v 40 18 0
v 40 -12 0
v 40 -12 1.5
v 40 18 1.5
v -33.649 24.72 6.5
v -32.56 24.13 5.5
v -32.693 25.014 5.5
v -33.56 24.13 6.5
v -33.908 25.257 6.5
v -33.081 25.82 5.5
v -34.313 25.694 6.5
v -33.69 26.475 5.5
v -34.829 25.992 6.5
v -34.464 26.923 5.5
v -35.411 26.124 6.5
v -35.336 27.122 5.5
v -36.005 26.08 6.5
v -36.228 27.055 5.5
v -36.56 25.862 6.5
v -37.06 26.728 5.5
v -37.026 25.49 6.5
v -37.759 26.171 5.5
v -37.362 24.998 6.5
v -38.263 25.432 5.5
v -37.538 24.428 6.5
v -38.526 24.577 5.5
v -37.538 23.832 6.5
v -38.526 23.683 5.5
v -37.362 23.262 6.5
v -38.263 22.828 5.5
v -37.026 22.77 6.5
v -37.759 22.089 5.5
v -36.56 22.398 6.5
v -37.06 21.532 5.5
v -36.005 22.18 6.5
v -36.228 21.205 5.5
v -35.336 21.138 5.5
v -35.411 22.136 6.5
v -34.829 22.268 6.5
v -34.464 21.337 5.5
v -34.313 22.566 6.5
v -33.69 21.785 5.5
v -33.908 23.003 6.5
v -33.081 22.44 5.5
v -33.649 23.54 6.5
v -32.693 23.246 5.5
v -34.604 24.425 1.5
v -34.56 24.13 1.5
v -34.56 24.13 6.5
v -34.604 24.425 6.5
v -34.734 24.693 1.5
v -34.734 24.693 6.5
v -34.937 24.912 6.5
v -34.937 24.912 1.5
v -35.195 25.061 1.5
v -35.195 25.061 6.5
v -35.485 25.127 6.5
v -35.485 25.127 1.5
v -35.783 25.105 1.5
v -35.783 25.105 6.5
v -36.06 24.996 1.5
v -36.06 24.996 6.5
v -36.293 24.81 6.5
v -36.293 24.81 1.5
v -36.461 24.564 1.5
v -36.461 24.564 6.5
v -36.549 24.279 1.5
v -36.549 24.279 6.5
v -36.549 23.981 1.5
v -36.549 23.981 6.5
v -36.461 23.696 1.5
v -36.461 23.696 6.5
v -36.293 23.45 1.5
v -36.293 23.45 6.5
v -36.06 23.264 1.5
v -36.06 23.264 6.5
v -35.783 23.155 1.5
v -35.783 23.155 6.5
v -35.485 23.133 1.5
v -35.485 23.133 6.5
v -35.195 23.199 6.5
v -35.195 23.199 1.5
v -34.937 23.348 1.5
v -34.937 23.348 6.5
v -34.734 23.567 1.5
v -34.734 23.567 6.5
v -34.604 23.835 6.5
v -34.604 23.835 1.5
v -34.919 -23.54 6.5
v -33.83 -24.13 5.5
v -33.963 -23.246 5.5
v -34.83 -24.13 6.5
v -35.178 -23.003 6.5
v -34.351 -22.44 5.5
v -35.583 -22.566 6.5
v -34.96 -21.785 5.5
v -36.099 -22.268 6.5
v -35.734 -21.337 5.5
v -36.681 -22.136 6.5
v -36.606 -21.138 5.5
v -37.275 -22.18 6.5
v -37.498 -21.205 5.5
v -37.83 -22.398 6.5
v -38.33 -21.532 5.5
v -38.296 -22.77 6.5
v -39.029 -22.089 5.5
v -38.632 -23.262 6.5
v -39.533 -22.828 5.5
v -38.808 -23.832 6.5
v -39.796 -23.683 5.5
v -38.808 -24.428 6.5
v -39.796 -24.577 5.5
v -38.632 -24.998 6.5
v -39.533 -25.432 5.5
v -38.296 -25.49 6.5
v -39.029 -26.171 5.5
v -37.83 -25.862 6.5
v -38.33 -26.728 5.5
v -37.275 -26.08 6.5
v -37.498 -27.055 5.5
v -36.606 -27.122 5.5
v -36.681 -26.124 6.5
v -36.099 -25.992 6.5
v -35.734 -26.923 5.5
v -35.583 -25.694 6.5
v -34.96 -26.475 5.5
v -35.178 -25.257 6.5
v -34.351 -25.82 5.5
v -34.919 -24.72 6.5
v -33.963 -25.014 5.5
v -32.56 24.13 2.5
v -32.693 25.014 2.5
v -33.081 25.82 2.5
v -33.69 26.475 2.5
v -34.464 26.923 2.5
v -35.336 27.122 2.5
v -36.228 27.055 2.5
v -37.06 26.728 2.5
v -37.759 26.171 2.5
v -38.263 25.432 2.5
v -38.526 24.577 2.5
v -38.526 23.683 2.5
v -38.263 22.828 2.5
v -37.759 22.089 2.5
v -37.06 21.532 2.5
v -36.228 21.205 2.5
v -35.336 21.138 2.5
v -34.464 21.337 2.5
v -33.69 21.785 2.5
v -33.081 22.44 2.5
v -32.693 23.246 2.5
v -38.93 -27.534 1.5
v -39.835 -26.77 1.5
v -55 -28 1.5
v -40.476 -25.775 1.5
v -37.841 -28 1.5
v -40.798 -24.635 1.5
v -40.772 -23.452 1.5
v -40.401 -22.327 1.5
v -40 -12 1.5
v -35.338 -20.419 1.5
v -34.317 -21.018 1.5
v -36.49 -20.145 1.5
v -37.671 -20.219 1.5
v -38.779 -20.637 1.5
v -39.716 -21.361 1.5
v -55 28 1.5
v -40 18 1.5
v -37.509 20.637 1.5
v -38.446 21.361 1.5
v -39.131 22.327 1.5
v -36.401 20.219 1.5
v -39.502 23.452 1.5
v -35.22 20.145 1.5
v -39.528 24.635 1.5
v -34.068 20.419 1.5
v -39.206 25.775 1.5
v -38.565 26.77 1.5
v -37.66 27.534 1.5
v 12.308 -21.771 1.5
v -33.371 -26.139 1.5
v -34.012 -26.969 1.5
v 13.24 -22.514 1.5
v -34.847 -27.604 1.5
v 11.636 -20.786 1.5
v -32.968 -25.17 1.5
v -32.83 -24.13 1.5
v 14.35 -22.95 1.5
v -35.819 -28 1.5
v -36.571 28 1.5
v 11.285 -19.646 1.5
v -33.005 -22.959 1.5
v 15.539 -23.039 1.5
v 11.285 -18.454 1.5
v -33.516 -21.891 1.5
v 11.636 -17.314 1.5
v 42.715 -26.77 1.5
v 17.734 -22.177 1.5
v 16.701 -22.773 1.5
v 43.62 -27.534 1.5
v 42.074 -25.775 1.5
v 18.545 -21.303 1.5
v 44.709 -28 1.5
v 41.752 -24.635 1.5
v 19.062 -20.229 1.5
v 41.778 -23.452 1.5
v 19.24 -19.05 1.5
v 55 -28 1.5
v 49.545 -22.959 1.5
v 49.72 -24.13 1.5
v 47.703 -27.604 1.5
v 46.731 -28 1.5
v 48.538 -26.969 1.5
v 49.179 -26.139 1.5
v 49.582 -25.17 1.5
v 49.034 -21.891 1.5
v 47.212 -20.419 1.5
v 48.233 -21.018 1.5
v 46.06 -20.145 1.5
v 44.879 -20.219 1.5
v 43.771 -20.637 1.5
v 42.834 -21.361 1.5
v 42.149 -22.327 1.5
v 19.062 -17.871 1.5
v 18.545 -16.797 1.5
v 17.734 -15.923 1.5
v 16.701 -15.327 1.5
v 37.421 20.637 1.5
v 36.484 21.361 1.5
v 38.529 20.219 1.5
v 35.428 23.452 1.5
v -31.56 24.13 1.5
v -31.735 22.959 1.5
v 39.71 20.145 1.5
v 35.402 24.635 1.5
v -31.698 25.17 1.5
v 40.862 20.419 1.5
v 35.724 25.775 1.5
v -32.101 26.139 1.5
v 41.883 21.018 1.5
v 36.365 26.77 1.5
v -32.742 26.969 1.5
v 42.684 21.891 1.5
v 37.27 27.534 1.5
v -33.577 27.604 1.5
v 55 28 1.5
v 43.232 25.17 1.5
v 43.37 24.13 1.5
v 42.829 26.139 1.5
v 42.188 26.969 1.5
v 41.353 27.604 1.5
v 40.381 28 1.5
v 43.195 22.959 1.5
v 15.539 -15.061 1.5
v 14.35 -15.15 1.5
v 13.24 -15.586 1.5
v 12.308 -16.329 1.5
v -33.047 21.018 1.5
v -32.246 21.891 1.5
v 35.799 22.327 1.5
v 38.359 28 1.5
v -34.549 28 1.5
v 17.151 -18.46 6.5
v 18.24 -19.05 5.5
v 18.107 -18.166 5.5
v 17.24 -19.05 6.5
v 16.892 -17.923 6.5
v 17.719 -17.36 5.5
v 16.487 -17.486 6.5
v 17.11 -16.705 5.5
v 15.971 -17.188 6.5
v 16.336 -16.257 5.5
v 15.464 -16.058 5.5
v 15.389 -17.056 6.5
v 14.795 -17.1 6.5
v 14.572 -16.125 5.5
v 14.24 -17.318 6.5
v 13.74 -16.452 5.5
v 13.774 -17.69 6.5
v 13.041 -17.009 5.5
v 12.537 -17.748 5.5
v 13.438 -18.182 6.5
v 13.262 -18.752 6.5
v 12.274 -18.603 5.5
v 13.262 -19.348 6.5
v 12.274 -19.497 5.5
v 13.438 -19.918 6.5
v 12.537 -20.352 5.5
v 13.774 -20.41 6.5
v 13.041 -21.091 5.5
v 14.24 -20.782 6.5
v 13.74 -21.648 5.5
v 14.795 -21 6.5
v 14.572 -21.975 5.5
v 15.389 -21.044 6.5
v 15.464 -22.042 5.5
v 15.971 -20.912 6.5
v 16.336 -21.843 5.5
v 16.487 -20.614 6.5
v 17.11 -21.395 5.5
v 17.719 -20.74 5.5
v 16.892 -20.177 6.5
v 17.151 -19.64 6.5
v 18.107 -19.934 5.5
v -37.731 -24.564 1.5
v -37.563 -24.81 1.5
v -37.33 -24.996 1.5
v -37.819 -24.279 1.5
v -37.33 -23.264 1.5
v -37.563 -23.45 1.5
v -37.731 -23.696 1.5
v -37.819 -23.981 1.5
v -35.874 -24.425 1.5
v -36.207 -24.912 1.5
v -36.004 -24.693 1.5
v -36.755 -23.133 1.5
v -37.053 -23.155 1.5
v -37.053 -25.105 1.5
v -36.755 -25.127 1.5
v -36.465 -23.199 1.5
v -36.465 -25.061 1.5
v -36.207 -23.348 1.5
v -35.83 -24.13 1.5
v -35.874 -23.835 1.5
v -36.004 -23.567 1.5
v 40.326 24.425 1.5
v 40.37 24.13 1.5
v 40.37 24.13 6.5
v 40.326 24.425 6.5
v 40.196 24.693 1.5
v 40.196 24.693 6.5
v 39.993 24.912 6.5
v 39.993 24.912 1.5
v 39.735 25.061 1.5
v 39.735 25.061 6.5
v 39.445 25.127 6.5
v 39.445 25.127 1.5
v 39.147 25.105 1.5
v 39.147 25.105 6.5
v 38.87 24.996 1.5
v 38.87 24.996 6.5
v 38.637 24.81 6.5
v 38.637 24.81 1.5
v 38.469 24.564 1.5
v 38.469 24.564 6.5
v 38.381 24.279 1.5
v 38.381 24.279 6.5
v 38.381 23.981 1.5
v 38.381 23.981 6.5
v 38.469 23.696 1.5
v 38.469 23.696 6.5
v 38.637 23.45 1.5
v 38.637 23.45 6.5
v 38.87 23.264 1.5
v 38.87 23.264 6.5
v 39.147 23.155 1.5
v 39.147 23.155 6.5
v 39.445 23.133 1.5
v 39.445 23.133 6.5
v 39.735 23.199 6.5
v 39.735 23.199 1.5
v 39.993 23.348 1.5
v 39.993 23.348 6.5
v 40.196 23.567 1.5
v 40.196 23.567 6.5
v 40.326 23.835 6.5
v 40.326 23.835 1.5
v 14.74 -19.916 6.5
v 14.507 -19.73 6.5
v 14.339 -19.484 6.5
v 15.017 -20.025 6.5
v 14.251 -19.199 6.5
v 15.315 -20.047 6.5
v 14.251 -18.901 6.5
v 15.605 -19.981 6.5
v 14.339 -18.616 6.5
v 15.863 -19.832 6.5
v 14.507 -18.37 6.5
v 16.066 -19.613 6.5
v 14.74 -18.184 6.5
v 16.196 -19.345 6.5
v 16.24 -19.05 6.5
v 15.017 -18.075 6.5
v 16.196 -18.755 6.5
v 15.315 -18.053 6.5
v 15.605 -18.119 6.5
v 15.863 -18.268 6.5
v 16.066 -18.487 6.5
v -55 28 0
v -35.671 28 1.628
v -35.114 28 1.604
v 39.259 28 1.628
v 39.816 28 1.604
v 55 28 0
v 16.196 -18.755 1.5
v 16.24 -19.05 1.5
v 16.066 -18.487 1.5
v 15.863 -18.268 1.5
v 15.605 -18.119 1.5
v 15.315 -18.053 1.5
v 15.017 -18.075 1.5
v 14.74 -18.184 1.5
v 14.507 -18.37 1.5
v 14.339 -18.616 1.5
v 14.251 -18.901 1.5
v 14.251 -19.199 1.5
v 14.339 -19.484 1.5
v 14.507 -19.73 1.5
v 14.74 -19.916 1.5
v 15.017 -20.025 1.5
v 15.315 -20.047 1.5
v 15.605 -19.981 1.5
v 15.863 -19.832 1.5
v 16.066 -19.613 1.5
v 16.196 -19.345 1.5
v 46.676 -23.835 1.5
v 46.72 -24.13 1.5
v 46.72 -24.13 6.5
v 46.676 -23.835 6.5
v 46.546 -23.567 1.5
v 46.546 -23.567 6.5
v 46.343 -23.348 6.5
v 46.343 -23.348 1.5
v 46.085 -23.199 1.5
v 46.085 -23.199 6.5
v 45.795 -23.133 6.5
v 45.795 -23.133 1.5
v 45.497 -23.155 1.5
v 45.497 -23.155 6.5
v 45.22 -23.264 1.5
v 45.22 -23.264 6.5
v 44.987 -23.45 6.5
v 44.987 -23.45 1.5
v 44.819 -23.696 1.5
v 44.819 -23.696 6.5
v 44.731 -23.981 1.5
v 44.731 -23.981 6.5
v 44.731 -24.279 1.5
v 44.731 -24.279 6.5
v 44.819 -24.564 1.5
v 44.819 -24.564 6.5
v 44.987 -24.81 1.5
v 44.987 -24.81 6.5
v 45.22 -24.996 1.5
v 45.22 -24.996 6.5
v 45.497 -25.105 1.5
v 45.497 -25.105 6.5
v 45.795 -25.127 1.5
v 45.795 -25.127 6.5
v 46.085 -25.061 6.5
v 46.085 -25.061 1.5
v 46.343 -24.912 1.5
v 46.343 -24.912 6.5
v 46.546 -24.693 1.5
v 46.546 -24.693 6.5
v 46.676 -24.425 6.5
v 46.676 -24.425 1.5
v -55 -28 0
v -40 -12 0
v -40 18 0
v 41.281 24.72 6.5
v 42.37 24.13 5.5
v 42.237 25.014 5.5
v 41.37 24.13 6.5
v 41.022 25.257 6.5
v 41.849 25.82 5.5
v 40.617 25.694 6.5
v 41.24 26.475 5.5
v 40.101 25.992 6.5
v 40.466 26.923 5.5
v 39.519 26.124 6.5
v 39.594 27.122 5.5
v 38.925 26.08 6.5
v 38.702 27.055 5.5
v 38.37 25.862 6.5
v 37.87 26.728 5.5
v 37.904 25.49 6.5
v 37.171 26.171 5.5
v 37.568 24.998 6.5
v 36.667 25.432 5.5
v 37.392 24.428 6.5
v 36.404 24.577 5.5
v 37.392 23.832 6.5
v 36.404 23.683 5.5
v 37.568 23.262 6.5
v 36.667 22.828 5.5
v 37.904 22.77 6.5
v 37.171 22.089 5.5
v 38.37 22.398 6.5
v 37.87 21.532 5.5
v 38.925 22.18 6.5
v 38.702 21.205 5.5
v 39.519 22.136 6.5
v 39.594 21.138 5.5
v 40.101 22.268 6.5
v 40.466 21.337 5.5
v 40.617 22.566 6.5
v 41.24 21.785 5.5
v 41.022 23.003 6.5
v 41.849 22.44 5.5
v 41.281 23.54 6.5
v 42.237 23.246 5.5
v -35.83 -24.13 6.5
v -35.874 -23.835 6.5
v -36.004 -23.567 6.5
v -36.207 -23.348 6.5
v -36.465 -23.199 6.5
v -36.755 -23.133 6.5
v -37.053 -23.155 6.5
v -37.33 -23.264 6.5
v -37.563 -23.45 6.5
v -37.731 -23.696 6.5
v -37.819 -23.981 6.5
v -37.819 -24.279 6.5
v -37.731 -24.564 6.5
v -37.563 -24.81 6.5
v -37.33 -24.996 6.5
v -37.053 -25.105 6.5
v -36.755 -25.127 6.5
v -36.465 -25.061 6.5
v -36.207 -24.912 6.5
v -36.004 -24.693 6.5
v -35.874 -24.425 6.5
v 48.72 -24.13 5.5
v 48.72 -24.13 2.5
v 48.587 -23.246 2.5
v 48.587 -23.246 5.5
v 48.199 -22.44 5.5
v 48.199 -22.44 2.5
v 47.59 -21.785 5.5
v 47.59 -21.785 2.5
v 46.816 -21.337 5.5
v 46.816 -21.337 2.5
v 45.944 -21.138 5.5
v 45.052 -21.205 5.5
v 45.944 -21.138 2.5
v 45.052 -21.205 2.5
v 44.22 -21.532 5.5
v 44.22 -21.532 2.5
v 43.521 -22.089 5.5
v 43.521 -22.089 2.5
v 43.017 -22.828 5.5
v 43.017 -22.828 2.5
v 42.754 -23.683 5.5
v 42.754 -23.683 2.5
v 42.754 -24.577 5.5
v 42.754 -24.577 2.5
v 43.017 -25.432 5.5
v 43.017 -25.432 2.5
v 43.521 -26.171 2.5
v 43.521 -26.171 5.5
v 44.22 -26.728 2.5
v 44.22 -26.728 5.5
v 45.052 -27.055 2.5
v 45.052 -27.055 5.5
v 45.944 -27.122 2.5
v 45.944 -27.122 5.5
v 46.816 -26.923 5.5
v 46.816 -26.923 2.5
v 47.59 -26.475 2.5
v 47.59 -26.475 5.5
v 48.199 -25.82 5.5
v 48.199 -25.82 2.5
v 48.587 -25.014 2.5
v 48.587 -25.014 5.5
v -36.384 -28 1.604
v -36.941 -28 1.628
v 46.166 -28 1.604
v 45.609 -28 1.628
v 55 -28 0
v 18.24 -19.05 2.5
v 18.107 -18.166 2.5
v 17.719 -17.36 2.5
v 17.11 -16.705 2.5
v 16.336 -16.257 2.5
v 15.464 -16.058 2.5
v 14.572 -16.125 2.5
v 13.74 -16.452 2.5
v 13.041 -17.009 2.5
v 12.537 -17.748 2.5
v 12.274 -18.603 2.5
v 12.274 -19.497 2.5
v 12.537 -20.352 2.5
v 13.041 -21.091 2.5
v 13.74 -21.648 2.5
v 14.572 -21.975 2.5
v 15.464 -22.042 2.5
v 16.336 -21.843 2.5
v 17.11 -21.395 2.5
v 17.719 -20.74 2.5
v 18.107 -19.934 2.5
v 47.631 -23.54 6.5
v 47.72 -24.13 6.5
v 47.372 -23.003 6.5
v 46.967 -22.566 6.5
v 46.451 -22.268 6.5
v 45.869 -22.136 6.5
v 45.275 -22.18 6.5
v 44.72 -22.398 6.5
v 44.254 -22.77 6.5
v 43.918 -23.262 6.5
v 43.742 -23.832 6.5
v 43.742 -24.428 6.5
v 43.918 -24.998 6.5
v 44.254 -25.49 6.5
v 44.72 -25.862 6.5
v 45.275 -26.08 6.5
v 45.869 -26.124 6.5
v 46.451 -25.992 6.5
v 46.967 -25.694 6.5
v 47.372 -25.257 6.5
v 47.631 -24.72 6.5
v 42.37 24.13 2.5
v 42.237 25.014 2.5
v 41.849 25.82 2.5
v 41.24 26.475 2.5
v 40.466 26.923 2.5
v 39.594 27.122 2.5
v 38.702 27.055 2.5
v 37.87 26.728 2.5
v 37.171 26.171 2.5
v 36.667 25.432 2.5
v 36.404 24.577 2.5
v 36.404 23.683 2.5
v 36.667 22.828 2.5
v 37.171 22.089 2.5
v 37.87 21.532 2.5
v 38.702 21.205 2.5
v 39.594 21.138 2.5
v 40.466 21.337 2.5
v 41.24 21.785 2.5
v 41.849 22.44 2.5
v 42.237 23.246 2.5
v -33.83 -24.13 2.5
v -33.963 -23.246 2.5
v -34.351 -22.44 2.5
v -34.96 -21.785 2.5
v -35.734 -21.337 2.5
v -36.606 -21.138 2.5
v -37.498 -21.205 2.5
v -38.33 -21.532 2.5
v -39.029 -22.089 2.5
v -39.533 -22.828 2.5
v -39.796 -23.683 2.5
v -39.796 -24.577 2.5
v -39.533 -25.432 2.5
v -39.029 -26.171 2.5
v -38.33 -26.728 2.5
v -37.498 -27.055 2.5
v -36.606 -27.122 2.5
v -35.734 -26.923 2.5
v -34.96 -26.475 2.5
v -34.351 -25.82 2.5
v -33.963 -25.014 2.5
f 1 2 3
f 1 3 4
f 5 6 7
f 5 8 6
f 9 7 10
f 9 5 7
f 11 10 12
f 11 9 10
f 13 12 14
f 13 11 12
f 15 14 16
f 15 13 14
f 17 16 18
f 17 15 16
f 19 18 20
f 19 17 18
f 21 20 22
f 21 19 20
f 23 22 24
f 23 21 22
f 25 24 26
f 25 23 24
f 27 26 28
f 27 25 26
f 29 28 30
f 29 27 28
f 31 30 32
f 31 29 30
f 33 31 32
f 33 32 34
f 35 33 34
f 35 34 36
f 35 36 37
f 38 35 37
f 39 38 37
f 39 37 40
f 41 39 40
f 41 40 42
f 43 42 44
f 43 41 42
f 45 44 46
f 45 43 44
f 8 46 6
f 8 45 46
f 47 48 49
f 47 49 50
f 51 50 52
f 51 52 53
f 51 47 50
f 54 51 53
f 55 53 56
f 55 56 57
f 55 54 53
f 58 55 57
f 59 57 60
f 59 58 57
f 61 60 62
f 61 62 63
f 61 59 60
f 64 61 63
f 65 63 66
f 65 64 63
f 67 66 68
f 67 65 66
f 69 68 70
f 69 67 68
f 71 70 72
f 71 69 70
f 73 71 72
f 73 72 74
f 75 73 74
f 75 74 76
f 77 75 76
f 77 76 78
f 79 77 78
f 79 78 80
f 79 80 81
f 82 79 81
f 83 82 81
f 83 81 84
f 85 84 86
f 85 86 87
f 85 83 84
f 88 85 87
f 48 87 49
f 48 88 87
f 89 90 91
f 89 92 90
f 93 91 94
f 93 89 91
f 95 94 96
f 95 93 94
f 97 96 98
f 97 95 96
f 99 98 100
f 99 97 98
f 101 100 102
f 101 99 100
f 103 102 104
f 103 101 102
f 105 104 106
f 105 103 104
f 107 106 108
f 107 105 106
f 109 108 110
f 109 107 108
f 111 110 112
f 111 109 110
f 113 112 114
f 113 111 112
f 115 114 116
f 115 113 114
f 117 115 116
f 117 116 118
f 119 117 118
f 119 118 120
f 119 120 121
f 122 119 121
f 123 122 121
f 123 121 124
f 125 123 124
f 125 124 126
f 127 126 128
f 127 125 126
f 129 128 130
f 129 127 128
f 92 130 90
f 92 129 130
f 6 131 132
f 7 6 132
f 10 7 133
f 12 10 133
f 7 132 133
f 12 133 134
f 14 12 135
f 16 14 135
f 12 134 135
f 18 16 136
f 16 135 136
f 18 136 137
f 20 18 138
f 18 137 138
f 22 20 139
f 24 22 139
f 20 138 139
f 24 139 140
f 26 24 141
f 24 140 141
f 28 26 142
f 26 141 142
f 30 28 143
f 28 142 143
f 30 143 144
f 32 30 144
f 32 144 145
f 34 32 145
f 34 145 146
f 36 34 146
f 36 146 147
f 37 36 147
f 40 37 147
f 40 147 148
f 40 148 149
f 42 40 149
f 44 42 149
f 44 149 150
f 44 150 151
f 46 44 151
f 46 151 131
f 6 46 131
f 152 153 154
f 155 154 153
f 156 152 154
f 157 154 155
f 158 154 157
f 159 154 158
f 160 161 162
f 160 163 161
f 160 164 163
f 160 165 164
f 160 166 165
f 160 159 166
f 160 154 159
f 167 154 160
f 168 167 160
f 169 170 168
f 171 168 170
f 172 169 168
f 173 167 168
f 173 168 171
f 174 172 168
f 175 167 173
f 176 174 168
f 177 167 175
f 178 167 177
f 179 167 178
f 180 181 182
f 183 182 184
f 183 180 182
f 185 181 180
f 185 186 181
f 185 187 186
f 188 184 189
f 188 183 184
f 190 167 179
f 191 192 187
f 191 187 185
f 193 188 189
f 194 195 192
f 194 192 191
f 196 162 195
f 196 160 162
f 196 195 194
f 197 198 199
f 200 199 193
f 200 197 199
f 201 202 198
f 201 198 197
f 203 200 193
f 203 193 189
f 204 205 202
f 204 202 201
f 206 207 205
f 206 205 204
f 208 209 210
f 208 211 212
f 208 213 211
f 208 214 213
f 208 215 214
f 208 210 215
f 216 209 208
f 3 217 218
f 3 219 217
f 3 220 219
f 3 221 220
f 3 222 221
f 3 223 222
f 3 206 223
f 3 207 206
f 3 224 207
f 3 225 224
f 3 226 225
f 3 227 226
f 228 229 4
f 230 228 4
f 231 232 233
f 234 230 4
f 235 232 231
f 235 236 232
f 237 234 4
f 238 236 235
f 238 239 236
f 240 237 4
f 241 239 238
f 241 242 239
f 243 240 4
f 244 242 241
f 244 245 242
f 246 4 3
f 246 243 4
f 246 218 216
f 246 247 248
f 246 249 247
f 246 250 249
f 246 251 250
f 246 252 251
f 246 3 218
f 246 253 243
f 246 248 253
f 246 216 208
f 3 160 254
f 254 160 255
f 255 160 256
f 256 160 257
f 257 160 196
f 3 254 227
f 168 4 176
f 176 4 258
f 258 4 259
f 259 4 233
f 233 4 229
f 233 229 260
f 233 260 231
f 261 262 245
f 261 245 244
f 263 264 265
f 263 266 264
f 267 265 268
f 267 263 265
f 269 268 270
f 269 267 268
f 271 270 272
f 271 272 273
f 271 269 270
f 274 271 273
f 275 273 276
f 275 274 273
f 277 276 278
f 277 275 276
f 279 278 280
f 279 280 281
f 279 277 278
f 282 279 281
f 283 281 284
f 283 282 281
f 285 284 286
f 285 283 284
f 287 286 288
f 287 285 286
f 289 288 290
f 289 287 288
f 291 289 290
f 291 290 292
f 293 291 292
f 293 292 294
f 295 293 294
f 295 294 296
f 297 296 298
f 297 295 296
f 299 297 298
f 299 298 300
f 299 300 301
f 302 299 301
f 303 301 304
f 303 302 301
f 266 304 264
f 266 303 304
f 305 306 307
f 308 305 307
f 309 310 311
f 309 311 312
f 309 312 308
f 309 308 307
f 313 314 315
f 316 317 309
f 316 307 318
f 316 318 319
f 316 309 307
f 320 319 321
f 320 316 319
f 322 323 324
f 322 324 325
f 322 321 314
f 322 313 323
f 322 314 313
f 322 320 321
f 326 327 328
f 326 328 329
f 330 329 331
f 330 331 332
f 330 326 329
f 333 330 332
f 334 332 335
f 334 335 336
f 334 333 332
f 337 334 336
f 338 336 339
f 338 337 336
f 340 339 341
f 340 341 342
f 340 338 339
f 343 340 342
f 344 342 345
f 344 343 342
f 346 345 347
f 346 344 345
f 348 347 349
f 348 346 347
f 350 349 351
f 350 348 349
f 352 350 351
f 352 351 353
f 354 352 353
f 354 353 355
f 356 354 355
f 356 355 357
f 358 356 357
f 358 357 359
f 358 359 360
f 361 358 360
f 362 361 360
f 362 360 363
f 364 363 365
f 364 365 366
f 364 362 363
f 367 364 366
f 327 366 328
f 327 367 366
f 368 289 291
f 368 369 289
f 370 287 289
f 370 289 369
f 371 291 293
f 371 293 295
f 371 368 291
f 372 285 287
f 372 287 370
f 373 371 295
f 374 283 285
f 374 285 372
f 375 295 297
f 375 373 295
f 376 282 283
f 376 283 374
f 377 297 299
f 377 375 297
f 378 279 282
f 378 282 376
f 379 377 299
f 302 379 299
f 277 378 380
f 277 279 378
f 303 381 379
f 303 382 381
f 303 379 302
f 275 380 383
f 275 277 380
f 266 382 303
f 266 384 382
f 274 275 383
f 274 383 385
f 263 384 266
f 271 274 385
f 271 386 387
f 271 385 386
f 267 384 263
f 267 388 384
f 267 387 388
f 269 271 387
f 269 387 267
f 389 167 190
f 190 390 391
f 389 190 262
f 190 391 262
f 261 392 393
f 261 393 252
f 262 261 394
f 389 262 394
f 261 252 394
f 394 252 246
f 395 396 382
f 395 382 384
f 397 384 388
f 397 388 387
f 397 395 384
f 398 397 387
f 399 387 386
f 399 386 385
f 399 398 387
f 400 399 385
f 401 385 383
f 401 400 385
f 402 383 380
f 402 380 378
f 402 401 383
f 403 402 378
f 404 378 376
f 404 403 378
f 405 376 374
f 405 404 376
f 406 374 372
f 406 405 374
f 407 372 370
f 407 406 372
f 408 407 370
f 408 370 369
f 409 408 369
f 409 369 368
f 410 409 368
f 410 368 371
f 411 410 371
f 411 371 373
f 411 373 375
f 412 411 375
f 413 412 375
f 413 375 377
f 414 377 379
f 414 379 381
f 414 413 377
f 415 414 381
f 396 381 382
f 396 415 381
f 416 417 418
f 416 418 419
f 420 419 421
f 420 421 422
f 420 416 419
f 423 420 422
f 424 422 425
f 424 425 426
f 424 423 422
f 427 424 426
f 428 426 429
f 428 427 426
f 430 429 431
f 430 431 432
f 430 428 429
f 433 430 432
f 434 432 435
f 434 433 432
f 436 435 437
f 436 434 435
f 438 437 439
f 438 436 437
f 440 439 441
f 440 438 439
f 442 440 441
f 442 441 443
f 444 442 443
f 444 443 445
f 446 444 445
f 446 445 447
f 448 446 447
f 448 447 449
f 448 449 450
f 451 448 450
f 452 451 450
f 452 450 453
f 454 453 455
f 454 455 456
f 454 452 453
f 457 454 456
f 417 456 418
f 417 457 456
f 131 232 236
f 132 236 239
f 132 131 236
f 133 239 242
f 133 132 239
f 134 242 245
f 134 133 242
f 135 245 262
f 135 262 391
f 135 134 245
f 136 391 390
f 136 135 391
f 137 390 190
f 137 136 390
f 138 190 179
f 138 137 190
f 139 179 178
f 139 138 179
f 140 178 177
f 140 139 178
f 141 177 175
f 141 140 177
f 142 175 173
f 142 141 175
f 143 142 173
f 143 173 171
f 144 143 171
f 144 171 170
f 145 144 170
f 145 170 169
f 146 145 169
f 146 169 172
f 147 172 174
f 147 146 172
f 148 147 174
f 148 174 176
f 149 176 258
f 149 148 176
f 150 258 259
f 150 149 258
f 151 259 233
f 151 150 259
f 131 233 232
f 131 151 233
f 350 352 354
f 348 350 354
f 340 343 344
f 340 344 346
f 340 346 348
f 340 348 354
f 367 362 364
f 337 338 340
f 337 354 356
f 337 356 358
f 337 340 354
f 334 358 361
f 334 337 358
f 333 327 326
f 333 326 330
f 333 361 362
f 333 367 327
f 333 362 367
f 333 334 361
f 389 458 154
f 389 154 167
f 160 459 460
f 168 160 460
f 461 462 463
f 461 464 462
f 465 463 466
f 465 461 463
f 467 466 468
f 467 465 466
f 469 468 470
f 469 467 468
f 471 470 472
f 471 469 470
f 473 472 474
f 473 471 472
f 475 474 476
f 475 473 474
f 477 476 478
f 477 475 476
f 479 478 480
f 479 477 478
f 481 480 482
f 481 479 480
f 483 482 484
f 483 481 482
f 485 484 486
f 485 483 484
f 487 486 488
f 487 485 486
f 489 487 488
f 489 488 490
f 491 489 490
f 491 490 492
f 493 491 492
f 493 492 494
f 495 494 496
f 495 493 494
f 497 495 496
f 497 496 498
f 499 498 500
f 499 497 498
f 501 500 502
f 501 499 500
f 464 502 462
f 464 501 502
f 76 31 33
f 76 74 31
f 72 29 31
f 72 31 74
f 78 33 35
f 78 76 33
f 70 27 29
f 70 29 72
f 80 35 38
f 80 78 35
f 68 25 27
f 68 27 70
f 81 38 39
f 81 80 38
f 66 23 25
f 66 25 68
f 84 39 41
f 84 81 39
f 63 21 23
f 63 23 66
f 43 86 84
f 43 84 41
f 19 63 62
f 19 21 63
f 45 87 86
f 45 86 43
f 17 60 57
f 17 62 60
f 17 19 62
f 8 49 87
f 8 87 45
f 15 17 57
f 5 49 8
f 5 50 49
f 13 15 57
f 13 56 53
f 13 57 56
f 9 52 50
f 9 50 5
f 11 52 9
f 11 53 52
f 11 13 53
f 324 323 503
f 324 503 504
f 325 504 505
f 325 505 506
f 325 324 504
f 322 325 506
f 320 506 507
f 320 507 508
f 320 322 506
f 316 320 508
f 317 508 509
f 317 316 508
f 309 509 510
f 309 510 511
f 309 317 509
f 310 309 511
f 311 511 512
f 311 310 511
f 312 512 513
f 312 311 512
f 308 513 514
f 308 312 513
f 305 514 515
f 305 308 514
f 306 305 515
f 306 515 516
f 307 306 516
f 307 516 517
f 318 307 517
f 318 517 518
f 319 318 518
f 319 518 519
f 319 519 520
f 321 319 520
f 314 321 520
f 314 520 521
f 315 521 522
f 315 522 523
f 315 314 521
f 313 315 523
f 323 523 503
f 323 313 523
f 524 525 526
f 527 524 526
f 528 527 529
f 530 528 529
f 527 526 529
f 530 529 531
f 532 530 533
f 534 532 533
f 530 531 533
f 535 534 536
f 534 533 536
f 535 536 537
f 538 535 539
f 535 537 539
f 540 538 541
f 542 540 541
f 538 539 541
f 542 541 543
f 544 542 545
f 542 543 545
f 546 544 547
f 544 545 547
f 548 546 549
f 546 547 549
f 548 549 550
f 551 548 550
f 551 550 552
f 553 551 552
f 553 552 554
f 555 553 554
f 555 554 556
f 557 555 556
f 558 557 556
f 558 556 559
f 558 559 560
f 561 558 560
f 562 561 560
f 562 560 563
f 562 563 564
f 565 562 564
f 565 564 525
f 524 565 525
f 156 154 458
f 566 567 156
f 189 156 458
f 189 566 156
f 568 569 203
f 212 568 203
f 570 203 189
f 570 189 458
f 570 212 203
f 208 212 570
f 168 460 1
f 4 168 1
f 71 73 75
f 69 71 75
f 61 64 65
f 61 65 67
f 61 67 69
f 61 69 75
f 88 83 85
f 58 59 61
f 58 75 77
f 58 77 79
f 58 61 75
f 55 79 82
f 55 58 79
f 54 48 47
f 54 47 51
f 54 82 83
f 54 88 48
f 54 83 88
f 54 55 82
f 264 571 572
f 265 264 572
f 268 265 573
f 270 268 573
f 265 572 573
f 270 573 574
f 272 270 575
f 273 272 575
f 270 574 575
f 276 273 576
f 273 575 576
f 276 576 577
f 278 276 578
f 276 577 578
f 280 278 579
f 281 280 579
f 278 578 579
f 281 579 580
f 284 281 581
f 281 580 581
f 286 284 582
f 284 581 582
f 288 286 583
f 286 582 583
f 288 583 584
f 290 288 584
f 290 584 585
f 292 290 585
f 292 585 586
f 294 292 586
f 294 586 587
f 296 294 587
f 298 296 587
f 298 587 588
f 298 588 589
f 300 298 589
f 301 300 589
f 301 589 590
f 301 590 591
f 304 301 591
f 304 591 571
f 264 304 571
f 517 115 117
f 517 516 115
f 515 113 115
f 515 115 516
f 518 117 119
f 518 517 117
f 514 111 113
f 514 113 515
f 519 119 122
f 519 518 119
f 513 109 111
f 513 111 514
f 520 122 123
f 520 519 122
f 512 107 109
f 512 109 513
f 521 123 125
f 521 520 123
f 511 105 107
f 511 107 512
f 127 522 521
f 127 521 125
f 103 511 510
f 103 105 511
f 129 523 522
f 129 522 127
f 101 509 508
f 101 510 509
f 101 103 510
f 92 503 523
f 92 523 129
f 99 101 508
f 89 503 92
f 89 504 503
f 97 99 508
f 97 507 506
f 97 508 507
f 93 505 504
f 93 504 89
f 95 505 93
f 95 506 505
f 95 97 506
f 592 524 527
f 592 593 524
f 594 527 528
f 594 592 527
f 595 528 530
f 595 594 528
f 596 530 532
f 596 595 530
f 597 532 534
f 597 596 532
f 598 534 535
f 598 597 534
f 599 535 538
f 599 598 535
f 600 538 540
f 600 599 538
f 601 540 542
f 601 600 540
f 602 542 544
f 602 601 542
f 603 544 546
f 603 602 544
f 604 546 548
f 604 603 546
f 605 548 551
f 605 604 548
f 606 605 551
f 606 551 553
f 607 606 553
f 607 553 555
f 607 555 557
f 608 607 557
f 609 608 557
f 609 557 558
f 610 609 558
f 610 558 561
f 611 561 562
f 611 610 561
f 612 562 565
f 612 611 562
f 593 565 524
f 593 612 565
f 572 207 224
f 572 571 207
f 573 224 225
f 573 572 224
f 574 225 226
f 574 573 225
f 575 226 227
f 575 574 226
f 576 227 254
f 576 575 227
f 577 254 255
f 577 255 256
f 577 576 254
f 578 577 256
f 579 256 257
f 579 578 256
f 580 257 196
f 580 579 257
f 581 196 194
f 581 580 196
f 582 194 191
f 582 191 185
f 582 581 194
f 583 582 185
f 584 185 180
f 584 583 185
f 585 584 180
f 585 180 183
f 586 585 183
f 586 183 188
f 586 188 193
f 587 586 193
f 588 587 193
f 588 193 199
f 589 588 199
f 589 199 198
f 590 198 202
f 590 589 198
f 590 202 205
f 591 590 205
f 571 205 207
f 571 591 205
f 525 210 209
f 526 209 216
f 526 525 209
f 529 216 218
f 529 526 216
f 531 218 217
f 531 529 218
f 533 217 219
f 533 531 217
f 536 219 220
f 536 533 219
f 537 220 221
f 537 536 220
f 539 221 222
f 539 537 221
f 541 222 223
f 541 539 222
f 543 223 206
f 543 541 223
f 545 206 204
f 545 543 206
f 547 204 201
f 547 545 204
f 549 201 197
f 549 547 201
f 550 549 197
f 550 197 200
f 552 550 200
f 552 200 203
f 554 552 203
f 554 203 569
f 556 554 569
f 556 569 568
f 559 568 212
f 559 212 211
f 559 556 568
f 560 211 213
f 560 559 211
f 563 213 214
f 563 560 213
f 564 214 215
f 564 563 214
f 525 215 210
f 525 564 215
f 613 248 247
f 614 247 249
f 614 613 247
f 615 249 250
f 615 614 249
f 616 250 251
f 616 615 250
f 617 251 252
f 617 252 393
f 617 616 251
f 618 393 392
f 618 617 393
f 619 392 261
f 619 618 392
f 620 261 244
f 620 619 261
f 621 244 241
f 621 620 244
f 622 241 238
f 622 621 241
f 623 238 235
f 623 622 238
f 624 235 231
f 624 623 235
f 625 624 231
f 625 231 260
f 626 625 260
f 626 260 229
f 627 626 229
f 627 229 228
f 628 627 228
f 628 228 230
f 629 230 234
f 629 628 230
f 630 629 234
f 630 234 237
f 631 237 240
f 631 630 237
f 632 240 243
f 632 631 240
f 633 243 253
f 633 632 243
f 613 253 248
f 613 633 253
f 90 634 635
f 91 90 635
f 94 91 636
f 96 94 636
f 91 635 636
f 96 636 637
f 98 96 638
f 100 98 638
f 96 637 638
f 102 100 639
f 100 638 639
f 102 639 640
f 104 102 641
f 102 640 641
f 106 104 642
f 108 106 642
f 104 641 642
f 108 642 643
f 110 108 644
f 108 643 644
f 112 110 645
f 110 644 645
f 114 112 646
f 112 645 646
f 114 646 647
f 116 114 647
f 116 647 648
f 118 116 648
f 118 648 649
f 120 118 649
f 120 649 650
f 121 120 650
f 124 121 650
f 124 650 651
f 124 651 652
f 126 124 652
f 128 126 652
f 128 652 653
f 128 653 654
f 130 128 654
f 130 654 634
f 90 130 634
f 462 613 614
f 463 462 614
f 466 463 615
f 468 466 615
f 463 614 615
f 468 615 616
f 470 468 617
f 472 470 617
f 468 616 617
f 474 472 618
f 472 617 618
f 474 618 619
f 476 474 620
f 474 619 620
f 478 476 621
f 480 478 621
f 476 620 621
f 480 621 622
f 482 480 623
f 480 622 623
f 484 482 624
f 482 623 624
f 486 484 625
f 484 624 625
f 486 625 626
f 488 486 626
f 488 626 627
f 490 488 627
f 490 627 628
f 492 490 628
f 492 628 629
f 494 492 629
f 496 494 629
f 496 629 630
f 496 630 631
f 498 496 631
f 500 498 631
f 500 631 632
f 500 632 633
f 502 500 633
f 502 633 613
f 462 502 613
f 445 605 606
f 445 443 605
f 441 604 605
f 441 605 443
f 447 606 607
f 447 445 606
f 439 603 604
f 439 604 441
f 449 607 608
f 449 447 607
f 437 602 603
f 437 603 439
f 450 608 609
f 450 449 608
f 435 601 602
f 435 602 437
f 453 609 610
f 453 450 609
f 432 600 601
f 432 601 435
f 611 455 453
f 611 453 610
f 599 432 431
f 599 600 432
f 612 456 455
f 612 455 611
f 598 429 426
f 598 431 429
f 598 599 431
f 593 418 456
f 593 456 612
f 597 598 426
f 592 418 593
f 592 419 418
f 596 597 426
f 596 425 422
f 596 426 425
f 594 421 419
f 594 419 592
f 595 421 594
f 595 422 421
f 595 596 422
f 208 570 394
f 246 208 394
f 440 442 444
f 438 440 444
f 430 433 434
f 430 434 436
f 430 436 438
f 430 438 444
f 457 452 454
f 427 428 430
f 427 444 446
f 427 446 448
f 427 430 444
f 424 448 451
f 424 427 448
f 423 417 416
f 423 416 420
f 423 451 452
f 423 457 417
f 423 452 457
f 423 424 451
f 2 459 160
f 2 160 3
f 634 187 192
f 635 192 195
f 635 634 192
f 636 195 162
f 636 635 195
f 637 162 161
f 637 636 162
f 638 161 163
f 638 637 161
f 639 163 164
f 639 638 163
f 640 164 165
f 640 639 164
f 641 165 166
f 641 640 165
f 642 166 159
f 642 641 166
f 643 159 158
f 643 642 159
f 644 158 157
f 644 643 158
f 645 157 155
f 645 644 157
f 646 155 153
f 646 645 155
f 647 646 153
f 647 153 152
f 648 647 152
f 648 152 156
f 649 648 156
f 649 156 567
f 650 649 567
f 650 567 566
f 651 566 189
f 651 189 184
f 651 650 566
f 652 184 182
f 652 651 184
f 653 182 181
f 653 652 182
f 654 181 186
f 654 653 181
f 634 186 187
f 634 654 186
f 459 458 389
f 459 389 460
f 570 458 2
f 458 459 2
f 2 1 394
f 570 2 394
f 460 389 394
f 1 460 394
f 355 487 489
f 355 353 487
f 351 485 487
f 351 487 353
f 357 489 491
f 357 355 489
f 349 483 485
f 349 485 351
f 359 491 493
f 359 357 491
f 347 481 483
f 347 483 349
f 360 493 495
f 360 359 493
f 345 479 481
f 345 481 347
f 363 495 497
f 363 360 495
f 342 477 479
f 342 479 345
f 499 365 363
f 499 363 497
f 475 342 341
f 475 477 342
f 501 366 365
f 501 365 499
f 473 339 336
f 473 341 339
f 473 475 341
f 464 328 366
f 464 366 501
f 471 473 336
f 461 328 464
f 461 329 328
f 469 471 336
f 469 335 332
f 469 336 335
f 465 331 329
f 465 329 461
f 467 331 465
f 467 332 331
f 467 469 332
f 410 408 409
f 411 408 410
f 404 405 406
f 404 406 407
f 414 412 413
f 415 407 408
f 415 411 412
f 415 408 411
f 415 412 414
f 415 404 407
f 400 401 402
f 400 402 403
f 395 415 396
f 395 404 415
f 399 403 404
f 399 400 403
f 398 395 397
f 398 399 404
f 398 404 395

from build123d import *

# Parameters (mm, degrees)
F0_W     = 110
F0_H     = 56
F0_W_2   = 80
F0_H_2   = 30
F1_DEPTH = 1.5
F2_R     = 3
F2_R_2   = 1
F3_DEPTH = 5


# Not quite as in the source:
# - a fillet or chamfer that OpenCascade refuses, or shapes differently, is made with other operations: its cross-section is extruded or revolved along the edge and cut away or added


with BuildPart() as f1:
    # F0 (on Top) → F1 (new body)
    with BuildSketch(Plane.XY):
        Rectangle(F0_W, F0_H)
        with Locations((0, 3)):
            Rectangle(F0_W_2, F0_H_2, mode=Mode.SUBTRACT)
    extrude(amount=F1_DEPTH)

    # F2 (on face) → F3 (join)
    with BuildSketch(Plane.XY.offset(1.5)):
        with Locations((-35.56, 24.13)):
            Circle(F2_R)
        with Locations((-35.56, 24.13)):
            Circle(F2_R_2, mode=Mode.SUBTRACT)
        with Locations((39.37, 24.13)):
            Circle(F2_R)
        with Locations((39.37, 24.13)):
            Circle(F2_R_2, mode=Mode.SUBTRACT)
        with Locations((-36.83, -24.13)):
            Circle(F2_R)
        with Locations((-36.83, -24.13)):
            Circle(F2_R_2, mode=Mode.SUBTRACT)
        with Locations((15.24, -19.05)):
            Circle(F2_R)
        with Locations((15.24, -19.05)):
            Circle(F2_R_2, mode=Mode.SUBTRACT)
        with Locations((45.72, -24.13)):
            Circle(F2_R)
        with Locations((45.72, -24.13)):
            Circle(F2_R_2, mode=Mode.SUBTRACT)
    extrude(amount=F3_DEPTH)

    # F4: chamfer of 1 on 10 edges, made by hand


with BuildPart() as f4_tool2:
    # F4_s3 → F4_t4 (revolve)
    with BuildSketch(Plane.XZ.offset(-24.13)):
        Polygon((-31.56, 1.5), (-32.56, 2.5), (-32.56, 1.5), align=None)
    revolve(axis=Axis((-35.56, 24.13, 1.5), (0, 0, 1)))

    split(bisect_by=Plane.XZ.offset(-28), keep=Keep.TOP)


with BuildPart() as f1_1:
    add(f1.part)

    # F4_t1: union F4_tool2
    add(f4_tool2.part)


with BuildPart() as f4_tool7:
    # F4_s8 → F4_t9 (revolve)
    with BuildSketch(Plane.XZ.offset(-24.13)):
        Polygon((43.37, 1.5), (42.37, 2.5), (42.37, 1.5), align=None)
    revolve(axis=Axis((39.37, 24.13, 1.5), (0, 0, 1)))

    split(bisect_by=Plane.XZ.offset(-28), keep=Keep.TOP)


with BuildPart() as f1_2:
    add(f1_1.part)

    # F4_t6: union F4_tool7
    add(f4_tool7.part)


with BuildPart() as f4_tool12:
    # F4_s13 → F4_t14 (revolve)
    with BuildSketch(Plane.XZ.offset(24.13)):
        Polygon((49.72, 1.5), (48.72, 2.5), (48.72, 1.5), align=None)
    revolve(axis=Axis((45.72, -24.13, 1.5), (0, 0, 1)))

    split(bisect_by=Plane.XZ.offset(28), keep=Keep.BOTTOM)


with BuildPart() as f1_3:
    add(f1_2.part)

    # F4_t11: union F4_tool12
    add(f4_tool12.part)

    # F4_s16 → F4_t17 (revolve)
    with BuildSketch(Plane.XZ.offset(19.05)):
        Polygon((19.24, 1.5), (18.24, 2.5), (18.24, 1.5), align=None)
    revolve(axis=Axis((15.24, -19.05, 1.5), (0, 0, 1)))


with BuildPart() as f4_tool19:
    # F4_s20 → F4_t21 (revolve)
    with BuildSketch(Plane.XZ.offset(24.13)):
        Polygon((-32.83, 1.5), (-33.83, 2.5), (-33.83, 1.5), align=None)
    revolve(axis=Axis((-36.83, -24.13, 1.5), (0, 0, 1)))

    split(bisect_by=Plane.XZ.offset(28), keep=Keep.BOTTOM)


with BuildPart() as f1_4:
    add(f1_3.part)

    # F4_t18: union F4_tool19
    add(f4_tool19.part)

    # F4_s23 → F4_t24 (revolve, cut)
    with BuildSketch(Plane.XZ.offset(24.13)):
        Polygon((-33.83, 5.5), (-34.83, 6.5), (-33.83, 6.5), align=None)
    revolve(axis=Axis((-36.83, -24.13, 6.5), (0, 0, 1)), mode=Mode.SUBTRACT)

    # F4_s25 → F4_t26 (revolve, cut)
    with BuildSketch(Plane.XZ.offset(-24.13)):
        Polygon((-32.56, 5.5), (-33.56, 6.5), (-32.56, 6.5), align=None)
    revolve(axis=Axis((-35.56, 24.13, 6.5), (0, 0, 1)), mode=Mode.SUBTRACT)

    # F4_s27 → F4_t28 (revolve, cut)
    with BuildSketch(Plane.XZ.offset(-24.13)):
        Polygon((42.37, 5.5), (41.37, 6.5), (42.37, 6.5), align=None)
    revolve(axis=Axis((39.37, 24.13, 6.5), (0, 0, 1)), mode=Mode.SUBTRACT)

    # F4_s29 → F4_t30 (revolve, cut)
    with BuildSketch(Plane.XZ.offset(24.13)):
        Polygon((48.72, 5.5), (47.72, 6.5), (48.72, 6.5), align=None)
    revolve(axis=Axis((45.72, -24.13, 6.5), (0, 0, 1)), mode=Mode.SUBTRACT)

    # F4_s31 → F4_t32 (revolve, cut)
    with BuildSketch(Plane.XZ.offset(19.05)):
        Polygon((18.24, 5.5), (17.24, 6.5), (18.24, 6.5), align=None)
    revolve(axis=Axis((15.24, -19.05, 6.5), (0, 0, 1)), mode=Mode.SUBTRACT)


solid = f1_4.part
